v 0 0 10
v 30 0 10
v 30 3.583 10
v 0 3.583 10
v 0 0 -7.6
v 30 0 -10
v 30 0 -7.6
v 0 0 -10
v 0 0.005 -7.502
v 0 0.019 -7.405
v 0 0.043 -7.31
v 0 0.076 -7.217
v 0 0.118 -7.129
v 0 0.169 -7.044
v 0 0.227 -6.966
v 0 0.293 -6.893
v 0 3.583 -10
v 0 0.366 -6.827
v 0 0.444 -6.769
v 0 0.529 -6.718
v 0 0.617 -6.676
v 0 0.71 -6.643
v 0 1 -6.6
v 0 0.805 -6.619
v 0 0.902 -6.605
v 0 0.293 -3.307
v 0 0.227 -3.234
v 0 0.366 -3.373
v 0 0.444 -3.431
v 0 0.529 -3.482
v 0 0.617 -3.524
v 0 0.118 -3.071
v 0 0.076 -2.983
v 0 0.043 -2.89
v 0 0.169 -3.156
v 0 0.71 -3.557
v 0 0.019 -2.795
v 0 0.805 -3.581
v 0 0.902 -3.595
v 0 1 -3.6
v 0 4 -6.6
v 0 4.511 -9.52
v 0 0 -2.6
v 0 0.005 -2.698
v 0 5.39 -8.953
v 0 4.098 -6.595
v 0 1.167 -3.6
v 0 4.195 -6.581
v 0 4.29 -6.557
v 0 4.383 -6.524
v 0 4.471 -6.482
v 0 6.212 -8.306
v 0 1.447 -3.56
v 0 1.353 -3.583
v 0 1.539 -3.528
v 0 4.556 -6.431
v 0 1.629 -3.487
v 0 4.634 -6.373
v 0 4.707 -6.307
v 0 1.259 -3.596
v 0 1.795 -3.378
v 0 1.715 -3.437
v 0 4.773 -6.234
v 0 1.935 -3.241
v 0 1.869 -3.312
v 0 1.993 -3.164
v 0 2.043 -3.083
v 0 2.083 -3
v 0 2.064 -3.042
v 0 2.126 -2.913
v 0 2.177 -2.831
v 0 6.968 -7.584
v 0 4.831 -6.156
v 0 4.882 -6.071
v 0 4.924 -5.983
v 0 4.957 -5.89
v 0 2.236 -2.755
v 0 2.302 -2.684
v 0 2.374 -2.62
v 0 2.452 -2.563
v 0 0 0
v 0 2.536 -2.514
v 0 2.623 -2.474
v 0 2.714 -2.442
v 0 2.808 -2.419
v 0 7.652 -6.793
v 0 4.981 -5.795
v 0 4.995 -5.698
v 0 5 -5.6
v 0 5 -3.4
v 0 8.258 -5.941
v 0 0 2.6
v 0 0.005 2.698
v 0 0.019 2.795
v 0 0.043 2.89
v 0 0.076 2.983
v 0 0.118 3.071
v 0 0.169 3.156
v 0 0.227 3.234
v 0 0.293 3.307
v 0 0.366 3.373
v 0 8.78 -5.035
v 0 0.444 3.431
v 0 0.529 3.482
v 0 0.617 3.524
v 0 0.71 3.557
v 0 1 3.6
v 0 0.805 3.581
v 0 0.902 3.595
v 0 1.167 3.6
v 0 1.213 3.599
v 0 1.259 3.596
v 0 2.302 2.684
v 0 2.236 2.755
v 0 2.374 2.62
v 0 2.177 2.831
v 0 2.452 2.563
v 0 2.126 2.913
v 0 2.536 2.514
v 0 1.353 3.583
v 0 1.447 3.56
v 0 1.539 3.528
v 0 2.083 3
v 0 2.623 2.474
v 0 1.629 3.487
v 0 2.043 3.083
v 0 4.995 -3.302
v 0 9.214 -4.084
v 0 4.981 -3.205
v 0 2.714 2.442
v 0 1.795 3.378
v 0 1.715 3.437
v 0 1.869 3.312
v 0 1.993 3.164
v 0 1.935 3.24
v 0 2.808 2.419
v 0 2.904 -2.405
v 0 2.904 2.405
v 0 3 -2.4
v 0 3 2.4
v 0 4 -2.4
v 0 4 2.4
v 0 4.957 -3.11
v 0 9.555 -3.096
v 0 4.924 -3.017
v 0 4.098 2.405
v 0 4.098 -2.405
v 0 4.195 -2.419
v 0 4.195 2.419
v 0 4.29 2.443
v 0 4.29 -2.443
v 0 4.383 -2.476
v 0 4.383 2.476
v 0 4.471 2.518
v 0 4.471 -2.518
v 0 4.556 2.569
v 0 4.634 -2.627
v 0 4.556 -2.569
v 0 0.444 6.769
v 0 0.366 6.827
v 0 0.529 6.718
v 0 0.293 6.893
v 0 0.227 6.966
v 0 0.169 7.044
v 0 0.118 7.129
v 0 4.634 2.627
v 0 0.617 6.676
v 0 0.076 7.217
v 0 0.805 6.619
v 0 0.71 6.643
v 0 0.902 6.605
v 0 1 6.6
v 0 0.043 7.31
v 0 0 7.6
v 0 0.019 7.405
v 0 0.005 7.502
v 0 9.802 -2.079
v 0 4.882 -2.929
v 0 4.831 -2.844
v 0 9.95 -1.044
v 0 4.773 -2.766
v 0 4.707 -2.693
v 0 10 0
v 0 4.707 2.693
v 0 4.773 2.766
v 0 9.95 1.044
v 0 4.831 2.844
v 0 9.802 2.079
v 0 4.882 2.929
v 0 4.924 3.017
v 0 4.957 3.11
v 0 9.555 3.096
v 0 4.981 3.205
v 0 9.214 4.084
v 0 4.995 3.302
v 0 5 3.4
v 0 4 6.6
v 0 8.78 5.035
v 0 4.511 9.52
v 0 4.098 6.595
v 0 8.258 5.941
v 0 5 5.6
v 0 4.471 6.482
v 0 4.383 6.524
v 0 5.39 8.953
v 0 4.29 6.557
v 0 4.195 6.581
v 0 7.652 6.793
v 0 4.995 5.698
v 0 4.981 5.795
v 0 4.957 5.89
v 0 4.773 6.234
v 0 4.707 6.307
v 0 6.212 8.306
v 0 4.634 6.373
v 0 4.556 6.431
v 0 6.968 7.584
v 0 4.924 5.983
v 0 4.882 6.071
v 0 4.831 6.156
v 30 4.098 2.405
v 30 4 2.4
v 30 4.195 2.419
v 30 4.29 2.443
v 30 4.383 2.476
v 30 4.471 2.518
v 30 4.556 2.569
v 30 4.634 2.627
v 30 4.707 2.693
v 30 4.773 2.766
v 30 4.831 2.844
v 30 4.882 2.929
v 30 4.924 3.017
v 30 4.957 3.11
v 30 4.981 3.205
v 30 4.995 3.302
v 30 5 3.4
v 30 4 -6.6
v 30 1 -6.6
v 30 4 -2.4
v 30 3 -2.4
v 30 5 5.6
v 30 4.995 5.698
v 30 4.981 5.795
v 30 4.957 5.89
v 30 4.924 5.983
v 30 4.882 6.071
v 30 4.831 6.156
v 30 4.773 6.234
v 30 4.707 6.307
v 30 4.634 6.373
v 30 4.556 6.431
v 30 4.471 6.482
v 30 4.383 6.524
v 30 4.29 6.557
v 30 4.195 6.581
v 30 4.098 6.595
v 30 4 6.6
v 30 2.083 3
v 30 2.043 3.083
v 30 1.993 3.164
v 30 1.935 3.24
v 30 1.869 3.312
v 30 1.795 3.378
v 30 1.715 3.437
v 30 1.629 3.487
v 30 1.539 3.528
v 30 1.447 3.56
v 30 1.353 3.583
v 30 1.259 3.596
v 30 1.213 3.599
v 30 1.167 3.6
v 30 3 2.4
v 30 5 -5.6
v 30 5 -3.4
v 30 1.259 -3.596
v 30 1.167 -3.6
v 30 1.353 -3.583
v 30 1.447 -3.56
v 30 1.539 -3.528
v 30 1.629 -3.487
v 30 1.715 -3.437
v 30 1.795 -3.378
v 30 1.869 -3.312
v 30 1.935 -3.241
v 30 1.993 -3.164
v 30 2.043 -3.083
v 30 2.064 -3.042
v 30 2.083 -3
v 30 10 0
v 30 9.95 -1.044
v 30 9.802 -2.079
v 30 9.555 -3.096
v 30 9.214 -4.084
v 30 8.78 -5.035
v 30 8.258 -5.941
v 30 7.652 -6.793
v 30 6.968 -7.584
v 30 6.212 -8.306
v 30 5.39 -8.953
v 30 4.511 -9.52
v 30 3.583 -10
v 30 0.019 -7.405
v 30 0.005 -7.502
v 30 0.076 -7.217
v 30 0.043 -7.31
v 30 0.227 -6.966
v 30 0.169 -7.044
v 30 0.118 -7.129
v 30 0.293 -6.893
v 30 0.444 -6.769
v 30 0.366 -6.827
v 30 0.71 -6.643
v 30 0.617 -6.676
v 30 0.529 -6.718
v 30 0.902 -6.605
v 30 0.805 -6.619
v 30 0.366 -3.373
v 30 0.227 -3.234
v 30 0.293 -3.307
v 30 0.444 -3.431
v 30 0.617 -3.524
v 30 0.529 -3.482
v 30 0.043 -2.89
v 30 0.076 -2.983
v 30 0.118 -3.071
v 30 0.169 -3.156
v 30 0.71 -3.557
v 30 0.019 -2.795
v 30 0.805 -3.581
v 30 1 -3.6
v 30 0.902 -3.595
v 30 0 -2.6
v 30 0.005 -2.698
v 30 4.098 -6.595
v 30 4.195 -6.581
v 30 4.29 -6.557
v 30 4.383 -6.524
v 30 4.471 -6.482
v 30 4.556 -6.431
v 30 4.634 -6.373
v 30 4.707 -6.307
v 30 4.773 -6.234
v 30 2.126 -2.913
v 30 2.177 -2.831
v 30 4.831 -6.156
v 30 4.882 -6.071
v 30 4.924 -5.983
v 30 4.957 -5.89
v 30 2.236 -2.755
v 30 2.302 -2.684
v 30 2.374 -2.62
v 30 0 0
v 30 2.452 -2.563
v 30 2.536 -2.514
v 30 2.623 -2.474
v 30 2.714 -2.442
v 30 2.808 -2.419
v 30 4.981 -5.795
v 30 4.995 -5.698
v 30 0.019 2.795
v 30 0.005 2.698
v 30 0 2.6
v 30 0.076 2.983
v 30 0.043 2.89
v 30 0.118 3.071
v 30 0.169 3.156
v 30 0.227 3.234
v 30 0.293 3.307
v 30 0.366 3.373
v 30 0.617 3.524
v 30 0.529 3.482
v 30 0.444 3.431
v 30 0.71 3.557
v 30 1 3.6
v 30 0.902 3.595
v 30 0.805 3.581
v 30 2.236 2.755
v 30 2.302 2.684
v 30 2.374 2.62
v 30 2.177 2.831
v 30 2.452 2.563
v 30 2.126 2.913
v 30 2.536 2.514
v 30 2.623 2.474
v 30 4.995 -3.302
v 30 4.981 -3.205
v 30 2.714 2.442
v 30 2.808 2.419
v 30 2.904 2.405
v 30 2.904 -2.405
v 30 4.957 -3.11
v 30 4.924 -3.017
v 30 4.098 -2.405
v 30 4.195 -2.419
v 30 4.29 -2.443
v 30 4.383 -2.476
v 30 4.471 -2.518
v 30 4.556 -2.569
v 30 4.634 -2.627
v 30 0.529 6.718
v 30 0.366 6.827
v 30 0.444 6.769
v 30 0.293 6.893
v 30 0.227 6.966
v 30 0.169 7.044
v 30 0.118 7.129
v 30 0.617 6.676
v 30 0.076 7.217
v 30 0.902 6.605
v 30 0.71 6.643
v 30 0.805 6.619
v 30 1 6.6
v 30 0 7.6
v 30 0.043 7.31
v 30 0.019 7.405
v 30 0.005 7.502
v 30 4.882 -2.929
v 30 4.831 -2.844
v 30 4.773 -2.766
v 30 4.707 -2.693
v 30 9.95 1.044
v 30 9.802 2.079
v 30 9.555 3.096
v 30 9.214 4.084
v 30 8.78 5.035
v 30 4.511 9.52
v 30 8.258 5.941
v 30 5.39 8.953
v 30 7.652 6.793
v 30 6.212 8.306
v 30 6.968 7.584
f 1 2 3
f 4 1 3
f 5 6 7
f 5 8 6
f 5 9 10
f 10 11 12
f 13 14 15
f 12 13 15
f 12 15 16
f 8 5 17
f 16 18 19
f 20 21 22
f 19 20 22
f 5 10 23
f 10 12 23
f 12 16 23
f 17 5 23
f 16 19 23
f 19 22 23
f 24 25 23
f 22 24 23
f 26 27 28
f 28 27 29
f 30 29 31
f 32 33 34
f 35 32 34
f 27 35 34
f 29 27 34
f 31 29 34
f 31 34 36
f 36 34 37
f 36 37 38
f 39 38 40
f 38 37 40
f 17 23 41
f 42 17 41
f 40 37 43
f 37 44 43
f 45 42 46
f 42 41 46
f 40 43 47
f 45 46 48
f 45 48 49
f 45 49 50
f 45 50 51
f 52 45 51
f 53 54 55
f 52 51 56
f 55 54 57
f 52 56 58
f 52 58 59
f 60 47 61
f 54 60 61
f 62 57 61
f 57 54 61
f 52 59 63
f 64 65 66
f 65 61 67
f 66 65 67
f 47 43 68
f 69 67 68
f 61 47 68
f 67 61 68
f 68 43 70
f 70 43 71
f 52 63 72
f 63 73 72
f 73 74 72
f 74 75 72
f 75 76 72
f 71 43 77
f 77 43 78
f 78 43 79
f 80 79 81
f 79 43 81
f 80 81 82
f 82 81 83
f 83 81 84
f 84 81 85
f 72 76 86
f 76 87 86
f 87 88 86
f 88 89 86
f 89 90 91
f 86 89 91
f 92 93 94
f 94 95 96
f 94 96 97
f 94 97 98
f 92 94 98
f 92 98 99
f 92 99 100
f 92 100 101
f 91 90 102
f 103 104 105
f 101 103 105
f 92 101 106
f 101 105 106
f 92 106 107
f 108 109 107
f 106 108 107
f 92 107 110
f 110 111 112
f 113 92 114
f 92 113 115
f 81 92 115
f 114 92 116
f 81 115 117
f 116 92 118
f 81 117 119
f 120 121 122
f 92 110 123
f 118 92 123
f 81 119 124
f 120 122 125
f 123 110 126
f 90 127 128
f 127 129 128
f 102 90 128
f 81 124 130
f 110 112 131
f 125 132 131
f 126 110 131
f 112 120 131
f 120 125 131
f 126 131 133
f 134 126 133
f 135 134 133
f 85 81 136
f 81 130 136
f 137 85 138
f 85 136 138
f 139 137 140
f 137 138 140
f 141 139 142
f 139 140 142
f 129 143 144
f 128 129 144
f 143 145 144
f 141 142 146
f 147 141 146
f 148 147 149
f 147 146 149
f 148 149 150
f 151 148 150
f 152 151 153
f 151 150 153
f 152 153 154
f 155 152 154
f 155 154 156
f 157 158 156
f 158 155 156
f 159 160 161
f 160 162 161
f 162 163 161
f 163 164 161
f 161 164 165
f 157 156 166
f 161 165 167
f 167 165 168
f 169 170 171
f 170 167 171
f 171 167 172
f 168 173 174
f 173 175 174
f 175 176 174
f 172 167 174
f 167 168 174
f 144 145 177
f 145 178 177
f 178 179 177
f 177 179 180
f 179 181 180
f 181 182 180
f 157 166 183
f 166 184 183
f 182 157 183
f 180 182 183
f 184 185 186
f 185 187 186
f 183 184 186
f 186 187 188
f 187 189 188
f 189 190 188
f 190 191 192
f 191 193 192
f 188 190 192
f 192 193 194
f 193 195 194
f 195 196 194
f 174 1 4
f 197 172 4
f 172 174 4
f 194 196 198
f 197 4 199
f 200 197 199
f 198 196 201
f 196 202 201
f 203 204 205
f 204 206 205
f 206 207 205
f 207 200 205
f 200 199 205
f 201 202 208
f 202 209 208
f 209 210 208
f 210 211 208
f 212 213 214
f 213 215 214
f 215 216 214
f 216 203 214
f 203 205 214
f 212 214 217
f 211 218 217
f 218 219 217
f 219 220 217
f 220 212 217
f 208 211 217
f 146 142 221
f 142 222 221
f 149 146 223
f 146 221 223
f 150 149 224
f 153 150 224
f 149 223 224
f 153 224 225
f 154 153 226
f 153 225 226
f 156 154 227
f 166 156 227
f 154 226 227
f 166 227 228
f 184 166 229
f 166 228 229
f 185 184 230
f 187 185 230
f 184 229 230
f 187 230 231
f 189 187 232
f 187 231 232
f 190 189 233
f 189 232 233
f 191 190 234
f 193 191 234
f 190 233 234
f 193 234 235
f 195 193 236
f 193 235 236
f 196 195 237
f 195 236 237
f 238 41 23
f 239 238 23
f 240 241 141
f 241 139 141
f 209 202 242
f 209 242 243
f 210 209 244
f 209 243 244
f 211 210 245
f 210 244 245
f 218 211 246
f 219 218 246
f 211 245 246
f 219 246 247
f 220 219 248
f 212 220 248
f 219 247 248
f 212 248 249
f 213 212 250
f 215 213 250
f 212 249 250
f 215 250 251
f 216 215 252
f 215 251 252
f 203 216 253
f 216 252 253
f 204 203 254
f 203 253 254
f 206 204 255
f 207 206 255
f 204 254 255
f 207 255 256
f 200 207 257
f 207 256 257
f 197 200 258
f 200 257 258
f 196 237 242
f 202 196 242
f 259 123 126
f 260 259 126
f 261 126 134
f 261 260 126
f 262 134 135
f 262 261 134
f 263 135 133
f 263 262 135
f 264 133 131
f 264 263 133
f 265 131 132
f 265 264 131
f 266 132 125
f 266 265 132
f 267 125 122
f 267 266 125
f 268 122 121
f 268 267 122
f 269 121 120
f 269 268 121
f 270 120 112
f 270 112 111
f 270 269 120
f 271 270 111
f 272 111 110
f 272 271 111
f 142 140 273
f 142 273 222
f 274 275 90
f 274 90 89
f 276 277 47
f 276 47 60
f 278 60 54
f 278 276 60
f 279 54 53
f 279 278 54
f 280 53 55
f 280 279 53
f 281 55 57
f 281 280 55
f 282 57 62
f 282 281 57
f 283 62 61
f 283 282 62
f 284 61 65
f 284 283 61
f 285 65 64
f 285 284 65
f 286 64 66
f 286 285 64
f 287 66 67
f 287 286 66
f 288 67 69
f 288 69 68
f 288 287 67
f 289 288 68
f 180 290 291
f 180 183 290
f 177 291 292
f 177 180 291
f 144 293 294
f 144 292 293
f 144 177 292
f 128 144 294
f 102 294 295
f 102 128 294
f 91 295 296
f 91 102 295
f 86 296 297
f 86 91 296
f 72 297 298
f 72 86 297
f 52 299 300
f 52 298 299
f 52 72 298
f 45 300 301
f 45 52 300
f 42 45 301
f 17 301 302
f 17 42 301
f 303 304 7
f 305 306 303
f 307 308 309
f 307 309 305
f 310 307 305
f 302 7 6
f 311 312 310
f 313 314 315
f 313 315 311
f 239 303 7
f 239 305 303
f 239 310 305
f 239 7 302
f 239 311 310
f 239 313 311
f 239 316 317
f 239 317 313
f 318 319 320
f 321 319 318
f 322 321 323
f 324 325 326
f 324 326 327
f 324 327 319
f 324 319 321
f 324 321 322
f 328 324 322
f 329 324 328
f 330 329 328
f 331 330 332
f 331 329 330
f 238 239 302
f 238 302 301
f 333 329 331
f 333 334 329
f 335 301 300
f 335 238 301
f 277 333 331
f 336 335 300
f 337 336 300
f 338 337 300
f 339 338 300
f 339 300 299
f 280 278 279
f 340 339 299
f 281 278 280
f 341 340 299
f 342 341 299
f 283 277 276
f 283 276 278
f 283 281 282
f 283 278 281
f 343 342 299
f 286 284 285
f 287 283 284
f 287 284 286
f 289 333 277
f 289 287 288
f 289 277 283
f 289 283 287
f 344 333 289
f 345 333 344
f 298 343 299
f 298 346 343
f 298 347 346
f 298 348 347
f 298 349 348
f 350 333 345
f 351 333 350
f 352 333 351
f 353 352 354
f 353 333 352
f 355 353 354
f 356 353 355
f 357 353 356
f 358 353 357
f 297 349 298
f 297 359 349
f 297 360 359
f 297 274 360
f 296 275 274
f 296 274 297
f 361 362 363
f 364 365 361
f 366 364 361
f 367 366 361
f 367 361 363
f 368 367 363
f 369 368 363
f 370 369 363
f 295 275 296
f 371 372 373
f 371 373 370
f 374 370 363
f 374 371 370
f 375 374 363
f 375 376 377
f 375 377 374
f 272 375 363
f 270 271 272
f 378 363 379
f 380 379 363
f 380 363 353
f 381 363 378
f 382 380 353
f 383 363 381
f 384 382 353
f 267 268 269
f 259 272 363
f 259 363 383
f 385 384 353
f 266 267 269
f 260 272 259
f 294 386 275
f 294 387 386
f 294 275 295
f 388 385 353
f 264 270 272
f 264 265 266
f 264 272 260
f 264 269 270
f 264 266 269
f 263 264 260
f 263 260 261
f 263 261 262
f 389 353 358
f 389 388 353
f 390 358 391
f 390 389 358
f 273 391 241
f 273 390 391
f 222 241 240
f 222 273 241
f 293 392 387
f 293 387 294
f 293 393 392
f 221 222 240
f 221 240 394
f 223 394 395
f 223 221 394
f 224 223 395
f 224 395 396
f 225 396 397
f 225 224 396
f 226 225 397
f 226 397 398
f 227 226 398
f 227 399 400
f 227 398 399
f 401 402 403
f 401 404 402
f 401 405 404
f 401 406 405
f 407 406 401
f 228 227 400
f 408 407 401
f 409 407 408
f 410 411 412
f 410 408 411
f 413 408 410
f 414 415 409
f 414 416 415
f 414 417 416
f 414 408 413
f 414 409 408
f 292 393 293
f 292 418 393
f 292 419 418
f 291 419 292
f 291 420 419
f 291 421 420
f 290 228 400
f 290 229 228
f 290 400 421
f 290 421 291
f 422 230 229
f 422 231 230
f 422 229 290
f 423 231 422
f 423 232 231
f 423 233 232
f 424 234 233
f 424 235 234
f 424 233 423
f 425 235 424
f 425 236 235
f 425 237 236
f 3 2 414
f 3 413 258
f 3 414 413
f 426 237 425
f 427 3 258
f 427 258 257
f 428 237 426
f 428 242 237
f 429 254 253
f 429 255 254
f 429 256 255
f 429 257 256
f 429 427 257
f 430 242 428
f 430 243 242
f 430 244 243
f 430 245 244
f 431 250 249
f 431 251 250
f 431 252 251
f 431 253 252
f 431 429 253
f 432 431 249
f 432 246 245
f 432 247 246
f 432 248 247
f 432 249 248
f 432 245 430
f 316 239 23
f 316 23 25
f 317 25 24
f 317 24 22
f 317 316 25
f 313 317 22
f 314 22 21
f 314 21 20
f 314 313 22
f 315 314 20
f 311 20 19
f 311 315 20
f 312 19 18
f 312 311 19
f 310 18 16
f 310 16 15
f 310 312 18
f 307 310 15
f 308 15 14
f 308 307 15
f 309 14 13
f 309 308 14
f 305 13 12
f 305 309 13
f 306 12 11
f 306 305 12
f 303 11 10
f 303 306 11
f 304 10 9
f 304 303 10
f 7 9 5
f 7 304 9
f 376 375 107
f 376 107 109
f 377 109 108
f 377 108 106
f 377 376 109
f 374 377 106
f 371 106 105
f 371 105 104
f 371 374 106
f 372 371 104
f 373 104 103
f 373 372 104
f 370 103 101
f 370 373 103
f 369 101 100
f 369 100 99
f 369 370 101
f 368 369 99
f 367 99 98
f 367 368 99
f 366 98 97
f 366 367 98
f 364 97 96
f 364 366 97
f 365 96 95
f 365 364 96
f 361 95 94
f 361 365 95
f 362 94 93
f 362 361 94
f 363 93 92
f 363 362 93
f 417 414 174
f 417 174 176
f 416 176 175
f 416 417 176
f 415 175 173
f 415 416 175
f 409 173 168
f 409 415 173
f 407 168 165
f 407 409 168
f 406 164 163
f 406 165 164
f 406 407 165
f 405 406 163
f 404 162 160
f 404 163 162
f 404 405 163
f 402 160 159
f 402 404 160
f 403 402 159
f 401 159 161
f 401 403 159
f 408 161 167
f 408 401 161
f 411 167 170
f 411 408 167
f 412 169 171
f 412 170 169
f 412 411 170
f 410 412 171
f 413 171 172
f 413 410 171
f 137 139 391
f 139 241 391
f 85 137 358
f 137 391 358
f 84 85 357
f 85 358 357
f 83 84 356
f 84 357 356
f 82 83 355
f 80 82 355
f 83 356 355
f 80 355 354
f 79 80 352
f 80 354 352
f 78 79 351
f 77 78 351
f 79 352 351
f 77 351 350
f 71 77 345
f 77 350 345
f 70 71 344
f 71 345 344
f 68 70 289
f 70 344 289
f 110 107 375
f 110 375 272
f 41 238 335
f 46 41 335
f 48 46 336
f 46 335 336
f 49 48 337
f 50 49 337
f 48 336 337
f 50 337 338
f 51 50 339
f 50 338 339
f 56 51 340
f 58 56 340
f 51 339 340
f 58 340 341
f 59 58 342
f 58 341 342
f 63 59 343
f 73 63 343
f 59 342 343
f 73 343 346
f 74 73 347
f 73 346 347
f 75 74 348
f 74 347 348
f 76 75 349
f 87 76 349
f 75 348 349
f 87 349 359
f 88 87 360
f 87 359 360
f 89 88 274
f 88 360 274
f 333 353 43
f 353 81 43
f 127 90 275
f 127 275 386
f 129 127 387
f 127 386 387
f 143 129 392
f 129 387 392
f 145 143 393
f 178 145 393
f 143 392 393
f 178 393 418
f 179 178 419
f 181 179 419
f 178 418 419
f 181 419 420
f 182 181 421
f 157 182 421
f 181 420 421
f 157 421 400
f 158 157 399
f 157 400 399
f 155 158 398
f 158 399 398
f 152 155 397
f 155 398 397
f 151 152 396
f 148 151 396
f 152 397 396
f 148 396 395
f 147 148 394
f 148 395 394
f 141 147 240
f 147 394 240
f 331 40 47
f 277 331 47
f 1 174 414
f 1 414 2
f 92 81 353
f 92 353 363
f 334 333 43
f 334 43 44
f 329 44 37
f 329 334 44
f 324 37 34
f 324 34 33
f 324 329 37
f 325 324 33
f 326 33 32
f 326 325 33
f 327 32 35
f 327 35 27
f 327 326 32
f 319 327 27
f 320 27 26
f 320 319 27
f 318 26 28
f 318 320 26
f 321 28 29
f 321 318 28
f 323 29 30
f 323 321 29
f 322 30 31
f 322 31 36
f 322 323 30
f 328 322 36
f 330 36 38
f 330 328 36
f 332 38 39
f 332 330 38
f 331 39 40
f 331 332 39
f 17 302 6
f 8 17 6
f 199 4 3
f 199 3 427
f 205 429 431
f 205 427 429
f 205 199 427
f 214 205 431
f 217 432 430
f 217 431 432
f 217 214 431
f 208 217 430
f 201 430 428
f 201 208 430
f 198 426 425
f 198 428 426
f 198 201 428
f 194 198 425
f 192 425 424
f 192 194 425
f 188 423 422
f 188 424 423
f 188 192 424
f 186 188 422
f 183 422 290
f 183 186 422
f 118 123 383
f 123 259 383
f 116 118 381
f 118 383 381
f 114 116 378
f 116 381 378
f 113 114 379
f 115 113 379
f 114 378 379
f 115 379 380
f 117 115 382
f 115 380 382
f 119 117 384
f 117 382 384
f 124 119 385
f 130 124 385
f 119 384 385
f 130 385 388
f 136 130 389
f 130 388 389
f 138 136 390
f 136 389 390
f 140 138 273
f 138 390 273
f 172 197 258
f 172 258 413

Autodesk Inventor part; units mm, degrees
ref_plane "YZ Plane" through (0, 0, 0) normal (1, 0, 0) x (0, 1, 0)
ref_plane "XZ Plane" through (0, 0, 0) normal (0, 1, 0) x (-1, 0, 0)
ref_plane "XY Plane" through (0, 0, 0) normal (0, 0, 1) x (1, 0, 0)
sketch "Szkic1" plane through (0, 0, 0) normal (1, 0, 0) x (0, 1, 0)
  line L0 (0, 0) -> (10, 0) construction
  line L1 (0, 0) -> (0, -3.6)
  line L2 (0, -3.6) -> (2, -3.6)
  line L3 (2, -3.6) -> (2, -2.4)
  line L4 (2, -2.4) -> (5, -2.4)
  line L5 (5, -2.4) -> (5, -6.6)
  line L6 (5, -6.6) -> (0, -6.6)
  arc A0 (3.5826, -10) -> (10, 0) centre (-1, 0) ccw
  line L7 (0, 0) -> (0, 3.6)
  line L8 (0, 3.6) -> (2, 3.6)
  line L9 (2, 3.6) -> (2, 2.4)
  line L10 (2, 2.4) -> (5, 2.4)
  line L11 (5, 2.4) -> (5, 6.6)
  line L12 (5, 6.6) -> (0, 6.6)
  arc A1 (10, 0) -> (3.5826, 10) centre (-1, 0) ccw
  line L13 (3.5826, -10) -> (0, -10)
  line L14 (0, -10) -> (0, -6.6)
  line L15 (0, 6.6) -> (0, 10)
  line L16 (0, 10) -> (3.5826, 10)
  dimension "d10" = 3.6
  dimension "d13" = 3
  dimension "d14" = 11
  dimension "d19" = 5
  dimension "d22" = 10
  dimension "d28" = 10
  dimension "d29" = 4.2
  dimension "d32" = 3
  dimension "d34" = 2
extrude "Wyciągnięcie proste1" add sketch "Szkic1" along normal blind 30
fillet "Zaokrąglenie2" radius 1 12 edges at (15, 5, -2.4) (15, 5, -6.6) (15, 2, -3.6) (15, 0, -3.6) (15, 0, 3.6) (15, 2, 3.6) (15, 2, 2.4) (15, 5, 2.4) (15, 5, 6.6) (15, 0, 6.6) (15, 0, -6.6) (15, 2, -2.4)
properties part number "wciskacz_v2" material "PLA"
